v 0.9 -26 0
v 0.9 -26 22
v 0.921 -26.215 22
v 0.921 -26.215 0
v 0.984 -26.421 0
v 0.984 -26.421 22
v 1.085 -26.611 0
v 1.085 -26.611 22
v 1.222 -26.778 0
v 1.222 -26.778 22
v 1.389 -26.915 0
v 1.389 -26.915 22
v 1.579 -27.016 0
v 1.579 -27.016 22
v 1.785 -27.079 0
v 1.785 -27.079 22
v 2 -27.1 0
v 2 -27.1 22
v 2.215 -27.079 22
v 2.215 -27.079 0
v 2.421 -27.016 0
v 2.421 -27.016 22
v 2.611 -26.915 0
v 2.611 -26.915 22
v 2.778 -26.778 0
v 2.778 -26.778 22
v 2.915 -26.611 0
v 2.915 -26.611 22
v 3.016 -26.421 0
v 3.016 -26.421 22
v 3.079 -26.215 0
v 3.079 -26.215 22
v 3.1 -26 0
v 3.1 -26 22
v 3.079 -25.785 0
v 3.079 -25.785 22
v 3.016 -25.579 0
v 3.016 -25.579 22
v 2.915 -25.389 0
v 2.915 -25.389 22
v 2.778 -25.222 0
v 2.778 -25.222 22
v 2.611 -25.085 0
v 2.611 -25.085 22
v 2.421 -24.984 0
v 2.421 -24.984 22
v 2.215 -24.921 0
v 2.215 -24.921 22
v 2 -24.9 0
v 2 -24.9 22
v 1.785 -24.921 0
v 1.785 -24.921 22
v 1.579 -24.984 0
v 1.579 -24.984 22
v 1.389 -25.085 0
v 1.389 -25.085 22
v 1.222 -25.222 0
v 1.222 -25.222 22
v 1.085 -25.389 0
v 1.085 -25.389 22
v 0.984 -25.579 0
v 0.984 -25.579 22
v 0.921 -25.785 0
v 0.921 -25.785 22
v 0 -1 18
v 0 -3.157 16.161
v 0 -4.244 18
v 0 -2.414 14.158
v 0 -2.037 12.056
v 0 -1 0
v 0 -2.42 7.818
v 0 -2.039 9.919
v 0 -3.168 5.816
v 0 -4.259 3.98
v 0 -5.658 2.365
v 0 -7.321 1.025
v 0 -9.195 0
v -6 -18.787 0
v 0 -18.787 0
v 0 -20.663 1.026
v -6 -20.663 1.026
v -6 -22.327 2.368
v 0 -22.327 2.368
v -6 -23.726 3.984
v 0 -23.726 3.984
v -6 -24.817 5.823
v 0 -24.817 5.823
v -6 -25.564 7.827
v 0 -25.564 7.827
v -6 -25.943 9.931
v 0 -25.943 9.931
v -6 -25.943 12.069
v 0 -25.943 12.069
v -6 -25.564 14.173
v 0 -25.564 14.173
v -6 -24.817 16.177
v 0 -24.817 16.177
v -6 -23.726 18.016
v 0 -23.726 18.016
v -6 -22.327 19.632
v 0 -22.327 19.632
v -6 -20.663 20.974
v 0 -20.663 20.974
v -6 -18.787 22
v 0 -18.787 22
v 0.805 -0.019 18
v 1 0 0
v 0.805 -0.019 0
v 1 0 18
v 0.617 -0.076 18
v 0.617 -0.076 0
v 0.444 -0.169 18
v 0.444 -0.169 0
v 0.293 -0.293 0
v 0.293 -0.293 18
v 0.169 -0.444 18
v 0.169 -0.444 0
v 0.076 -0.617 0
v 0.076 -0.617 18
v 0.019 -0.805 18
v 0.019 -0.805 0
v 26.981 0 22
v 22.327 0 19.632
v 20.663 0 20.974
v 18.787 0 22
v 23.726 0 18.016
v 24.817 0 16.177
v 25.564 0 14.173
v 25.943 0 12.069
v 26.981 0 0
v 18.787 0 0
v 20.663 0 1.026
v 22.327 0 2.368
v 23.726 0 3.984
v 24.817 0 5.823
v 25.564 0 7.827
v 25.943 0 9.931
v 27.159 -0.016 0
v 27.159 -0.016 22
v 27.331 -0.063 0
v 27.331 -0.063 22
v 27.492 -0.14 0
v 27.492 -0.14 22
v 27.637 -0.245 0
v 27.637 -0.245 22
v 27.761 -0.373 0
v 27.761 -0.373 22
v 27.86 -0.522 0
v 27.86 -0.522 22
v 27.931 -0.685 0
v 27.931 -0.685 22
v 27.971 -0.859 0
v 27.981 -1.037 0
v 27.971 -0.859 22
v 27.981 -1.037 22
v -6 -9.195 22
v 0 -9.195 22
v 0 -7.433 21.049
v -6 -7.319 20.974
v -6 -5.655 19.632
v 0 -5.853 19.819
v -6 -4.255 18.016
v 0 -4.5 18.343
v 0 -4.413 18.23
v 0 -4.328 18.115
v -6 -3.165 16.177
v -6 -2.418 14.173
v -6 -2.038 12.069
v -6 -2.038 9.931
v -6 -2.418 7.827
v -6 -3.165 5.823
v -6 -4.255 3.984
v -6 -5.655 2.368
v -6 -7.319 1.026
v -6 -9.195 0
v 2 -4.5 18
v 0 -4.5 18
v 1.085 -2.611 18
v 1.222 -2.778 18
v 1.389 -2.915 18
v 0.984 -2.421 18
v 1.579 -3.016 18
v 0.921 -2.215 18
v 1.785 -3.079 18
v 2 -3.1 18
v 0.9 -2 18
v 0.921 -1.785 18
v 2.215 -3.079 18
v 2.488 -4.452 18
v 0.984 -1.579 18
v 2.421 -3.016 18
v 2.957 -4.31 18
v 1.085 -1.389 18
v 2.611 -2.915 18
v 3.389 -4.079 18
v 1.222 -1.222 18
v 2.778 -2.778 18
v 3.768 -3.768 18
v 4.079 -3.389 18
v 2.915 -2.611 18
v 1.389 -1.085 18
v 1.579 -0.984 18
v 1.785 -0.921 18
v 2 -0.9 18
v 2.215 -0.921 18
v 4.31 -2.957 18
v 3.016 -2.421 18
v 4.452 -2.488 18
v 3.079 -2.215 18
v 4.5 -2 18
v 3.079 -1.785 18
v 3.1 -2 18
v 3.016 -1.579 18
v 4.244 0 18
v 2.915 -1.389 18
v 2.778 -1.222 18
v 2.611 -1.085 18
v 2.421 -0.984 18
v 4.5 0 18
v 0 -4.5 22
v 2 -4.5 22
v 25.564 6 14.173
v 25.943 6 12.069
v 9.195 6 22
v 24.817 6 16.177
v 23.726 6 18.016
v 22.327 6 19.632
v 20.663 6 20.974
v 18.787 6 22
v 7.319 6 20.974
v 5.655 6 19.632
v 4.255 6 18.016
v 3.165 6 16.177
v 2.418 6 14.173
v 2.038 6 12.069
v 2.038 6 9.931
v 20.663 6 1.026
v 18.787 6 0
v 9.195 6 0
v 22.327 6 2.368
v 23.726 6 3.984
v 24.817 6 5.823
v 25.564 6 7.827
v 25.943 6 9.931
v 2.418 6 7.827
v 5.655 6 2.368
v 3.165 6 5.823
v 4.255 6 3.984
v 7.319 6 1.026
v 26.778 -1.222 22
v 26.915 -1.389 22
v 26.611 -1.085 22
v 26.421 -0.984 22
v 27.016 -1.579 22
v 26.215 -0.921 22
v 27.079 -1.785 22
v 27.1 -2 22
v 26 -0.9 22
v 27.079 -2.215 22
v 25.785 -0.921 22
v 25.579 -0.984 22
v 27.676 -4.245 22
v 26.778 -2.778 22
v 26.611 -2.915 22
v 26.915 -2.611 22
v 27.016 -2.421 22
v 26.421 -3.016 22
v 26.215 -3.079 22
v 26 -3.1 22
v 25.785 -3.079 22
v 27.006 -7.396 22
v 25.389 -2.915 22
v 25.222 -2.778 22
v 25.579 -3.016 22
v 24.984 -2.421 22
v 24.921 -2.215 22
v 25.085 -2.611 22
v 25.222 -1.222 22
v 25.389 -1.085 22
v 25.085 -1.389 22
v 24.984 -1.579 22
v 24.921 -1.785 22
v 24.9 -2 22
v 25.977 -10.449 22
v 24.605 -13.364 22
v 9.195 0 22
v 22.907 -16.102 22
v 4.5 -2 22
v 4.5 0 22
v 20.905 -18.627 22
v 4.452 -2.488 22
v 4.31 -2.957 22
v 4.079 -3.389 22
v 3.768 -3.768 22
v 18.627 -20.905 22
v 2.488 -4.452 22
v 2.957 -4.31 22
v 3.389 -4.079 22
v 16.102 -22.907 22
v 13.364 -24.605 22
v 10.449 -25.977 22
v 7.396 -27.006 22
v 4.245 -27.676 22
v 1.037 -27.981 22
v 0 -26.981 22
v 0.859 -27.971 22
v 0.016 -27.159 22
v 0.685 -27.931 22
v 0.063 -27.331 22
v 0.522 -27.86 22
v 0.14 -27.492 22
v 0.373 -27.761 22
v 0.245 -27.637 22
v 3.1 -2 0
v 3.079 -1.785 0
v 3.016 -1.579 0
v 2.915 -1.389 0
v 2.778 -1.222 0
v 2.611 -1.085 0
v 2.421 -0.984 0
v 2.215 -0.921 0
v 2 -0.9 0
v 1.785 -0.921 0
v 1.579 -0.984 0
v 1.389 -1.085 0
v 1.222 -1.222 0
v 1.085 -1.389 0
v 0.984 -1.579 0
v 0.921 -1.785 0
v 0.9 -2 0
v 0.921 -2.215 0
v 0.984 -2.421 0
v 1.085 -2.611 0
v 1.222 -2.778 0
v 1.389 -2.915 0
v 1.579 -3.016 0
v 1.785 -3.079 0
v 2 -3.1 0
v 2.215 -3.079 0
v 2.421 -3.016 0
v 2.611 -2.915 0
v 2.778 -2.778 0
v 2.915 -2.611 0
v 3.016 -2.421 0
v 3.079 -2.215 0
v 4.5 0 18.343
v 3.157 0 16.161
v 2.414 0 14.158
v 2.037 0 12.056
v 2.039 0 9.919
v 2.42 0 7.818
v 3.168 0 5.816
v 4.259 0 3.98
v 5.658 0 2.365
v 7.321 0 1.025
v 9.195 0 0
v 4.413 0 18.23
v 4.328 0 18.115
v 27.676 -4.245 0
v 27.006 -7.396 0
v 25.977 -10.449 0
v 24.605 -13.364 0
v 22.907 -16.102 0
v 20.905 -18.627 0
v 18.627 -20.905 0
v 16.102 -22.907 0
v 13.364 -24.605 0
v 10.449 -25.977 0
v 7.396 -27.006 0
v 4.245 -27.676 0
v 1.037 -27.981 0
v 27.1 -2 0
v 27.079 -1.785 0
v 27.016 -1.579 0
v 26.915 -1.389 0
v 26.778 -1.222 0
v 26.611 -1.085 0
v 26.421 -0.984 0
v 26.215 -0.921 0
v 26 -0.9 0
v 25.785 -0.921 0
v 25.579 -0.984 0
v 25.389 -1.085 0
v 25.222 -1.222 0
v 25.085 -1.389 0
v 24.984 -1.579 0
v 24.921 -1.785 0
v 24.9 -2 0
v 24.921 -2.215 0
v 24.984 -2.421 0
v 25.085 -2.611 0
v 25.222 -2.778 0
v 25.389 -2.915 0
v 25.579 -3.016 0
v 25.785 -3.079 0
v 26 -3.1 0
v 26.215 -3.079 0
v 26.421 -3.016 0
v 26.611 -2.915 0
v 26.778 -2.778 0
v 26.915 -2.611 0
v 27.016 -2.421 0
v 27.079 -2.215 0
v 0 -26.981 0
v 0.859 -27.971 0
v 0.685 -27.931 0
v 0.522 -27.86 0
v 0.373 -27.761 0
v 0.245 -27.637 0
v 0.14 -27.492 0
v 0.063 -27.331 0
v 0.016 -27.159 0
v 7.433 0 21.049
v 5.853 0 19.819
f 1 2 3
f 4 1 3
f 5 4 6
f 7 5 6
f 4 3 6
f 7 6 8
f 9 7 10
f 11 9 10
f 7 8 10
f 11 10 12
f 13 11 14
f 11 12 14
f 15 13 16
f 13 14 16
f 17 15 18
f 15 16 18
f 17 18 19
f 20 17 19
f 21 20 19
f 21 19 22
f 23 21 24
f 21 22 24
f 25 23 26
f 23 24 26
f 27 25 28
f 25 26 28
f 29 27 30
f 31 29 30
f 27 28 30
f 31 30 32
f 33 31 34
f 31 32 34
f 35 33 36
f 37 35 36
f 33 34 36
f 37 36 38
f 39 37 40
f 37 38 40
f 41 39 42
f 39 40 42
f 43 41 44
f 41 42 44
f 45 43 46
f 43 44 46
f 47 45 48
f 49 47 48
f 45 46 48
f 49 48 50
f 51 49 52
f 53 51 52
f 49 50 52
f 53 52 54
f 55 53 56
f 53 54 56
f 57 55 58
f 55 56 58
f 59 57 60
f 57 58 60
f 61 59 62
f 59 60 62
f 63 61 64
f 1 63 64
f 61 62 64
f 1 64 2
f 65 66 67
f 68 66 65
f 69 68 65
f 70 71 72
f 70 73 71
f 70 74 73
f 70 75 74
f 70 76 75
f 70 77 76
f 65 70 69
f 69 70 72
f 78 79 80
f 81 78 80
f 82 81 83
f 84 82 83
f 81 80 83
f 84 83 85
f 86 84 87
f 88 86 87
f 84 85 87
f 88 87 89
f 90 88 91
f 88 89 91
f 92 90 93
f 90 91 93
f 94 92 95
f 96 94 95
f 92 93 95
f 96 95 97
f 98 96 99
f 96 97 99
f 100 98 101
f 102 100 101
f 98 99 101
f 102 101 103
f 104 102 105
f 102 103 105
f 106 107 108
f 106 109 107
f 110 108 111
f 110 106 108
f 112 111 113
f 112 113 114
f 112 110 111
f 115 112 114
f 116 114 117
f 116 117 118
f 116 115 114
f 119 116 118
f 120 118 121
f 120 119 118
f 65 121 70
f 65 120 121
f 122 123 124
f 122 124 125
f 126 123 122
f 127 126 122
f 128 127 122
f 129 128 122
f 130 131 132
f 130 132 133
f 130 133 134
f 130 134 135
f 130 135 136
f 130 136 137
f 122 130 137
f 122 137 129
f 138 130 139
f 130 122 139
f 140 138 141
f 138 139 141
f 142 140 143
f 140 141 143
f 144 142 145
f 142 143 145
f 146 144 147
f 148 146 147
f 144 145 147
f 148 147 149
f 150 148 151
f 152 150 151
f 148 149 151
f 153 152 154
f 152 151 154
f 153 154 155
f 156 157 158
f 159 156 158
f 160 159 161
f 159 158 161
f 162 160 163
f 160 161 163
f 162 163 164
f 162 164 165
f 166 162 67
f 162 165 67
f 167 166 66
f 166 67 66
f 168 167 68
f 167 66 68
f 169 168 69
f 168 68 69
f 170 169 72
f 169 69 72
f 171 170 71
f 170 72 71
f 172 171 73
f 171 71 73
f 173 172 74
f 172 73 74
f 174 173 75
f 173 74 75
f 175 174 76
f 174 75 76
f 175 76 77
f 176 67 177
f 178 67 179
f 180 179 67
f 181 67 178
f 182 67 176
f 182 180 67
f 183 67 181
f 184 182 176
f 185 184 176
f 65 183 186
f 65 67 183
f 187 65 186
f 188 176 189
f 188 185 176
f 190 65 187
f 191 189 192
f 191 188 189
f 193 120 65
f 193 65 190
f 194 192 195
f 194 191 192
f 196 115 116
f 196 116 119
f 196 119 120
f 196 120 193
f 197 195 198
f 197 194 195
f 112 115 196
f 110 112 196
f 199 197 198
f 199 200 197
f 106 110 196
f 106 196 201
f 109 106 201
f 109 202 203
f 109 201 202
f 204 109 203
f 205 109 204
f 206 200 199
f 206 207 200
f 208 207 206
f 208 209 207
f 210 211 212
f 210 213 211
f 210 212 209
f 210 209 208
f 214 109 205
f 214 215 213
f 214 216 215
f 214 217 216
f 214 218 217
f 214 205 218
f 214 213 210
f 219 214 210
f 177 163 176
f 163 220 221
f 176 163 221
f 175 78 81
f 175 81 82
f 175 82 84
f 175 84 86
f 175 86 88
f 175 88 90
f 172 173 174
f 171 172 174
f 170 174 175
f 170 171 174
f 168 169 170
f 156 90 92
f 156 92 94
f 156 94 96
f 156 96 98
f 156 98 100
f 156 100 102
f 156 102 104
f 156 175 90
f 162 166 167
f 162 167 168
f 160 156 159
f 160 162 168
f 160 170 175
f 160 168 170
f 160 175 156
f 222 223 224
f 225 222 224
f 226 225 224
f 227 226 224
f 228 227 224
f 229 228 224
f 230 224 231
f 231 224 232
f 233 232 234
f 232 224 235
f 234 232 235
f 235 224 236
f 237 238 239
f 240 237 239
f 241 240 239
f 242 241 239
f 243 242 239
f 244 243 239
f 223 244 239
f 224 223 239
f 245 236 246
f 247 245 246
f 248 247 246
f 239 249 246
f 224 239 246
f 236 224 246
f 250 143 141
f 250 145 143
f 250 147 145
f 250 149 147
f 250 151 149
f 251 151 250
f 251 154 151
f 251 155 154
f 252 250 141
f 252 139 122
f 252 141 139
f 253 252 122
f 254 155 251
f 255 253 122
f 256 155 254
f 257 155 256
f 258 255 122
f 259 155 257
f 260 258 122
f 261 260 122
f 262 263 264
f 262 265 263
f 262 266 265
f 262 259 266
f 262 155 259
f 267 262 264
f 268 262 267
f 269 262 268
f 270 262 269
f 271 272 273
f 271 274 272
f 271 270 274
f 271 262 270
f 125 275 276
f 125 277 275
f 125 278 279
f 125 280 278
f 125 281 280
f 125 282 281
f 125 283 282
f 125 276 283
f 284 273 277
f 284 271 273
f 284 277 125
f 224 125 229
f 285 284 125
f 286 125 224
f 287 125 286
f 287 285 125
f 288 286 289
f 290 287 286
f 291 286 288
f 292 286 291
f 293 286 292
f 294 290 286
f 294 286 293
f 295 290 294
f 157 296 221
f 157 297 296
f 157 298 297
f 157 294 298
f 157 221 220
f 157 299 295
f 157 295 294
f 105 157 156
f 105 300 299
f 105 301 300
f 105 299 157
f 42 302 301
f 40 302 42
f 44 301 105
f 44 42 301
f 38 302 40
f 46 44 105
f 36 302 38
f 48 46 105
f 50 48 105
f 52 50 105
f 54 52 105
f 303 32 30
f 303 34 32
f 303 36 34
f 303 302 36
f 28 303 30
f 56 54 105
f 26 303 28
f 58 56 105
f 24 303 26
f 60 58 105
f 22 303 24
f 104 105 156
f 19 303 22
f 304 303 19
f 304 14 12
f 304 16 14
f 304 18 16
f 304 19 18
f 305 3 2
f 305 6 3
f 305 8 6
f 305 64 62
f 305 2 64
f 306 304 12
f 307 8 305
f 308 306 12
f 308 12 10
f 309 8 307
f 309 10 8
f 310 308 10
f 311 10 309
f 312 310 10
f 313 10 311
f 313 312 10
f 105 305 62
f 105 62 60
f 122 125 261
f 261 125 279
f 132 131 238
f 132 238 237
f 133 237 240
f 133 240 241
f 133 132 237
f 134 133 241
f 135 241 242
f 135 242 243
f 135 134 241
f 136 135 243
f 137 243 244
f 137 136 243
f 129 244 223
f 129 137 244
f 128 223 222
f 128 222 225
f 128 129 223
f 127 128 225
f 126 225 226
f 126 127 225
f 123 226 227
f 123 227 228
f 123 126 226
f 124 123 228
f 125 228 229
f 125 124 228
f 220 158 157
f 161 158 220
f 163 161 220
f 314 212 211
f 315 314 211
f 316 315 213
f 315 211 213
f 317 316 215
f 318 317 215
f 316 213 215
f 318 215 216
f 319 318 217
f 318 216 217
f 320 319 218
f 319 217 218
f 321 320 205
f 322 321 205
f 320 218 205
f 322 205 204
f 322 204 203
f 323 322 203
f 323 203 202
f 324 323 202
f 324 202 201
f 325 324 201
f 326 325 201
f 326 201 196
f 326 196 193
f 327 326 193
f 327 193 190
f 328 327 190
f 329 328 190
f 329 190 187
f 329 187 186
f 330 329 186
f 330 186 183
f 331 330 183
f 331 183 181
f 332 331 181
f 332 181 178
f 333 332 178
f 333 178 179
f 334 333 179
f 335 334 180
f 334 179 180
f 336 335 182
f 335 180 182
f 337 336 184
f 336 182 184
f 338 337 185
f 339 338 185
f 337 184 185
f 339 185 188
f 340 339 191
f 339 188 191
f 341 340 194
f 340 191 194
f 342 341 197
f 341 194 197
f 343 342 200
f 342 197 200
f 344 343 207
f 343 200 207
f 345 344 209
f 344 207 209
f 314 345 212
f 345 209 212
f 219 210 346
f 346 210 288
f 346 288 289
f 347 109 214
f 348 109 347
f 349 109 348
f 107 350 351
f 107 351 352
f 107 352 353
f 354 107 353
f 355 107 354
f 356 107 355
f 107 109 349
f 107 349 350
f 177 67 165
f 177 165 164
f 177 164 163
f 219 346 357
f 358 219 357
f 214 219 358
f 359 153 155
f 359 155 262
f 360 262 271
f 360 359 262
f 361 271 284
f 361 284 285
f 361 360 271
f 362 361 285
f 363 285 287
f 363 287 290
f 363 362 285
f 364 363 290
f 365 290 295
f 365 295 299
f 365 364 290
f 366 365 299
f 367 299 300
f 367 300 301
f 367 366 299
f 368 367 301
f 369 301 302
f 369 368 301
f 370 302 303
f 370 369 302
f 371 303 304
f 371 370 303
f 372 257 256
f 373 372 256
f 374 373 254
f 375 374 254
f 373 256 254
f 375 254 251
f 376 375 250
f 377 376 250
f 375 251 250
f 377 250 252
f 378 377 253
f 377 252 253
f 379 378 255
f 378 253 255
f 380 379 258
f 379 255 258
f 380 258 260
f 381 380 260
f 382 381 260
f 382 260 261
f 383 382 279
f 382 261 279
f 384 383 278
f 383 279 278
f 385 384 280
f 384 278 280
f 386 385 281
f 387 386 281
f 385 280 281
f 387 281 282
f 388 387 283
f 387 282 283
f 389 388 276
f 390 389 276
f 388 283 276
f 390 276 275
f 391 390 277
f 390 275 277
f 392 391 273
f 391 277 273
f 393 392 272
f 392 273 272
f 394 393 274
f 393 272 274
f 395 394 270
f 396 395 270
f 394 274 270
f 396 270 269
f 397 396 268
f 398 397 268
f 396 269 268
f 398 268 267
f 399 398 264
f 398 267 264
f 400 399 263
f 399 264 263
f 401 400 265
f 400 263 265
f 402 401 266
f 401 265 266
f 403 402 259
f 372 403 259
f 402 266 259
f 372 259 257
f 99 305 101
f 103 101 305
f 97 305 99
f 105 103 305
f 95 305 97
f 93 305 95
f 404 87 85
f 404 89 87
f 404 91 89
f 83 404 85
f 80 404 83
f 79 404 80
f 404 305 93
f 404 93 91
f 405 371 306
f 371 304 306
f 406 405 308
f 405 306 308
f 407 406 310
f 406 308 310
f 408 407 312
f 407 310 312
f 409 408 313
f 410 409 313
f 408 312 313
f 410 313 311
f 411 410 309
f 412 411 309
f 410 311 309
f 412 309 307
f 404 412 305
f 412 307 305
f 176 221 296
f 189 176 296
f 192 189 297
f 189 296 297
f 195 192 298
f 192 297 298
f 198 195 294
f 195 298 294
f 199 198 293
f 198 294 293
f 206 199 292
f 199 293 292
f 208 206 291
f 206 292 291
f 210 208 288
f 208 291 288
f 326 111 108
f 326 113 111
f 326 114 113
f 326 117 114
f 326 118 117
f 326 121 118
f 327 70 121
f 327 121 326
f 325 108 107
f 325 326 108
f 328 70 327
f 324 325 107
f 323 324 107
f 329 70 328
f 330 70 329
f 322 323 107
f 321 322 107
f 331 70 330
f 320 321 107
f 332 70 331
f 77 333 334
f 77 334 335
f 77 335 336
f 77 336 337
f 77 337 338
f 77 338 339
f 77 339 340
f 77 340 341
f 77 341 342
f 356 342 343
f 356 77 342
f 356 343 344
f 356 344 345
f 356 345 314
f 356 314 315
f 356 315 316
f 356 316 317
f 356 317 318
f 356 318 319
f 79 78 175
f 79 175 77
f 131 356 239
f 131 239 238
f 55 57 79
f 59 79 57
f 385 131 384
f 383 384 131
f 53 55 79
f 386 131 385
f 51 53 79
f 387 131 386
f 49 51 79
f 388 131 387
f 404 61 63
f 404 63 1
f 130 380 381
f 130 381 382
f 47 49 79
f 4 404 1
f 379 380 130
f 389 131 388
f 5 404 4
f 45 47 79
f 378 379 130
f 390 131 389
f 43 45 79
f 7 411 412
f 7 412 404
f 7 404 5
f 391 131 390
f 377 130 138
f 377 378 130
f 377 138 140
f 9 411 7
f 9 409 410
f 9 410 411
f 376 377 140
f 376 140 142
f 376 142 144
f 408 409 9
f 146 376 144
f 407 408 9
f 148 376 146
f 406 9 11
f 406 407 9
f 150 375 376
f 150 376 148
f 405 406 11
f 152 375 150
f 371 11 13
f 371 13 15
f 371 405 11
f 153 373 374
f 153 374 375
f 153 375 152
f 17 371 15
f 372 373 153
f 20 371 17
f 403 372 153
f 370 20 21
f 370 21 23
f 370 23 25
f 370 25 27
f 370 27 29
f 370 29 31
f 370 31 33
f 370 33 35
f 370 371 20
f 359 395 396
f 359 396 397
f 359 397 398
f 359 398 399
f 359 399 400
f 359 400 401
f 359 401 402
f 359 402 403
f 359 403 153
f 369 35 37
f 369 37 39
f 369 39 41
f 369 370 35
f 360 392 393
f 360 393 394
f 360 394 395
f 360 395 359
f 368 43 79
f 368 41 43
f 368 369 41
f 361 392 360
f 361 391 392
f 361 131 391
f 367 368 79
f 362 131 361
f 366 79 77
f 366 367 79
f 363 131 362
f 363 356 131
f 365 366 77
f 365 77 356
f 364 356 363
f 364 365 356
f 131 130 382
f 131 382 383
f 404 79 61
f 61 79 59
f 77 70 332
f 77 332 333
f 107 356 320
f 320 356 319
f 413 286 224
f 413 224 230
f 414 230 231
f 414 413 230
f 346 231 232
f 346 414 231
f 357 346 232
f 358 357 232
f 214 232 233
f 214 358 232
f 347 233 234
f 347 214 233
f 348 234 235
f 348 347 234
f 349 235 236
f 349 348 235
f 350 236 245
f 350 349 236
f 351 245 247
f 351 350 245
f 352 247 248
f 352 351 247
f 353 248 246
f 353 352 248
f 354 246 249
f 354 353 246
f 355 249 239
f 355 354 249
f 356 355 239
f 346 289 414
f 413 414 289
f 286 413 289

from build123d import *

# Parameters (mm, degrees)
EXTRUDE_1_DEPTH     = 22
SKETCH_2_R          = 1.1
CUT_EXTRUDE_1_DEPTH = 22
CUT_EXTRUDE_2_DEPTH = 4
FILLET_2_R          = 1
EXTRUDE_2_DEPTH     = 6
EXTRUDE_3_DEPTH     = 6


with BuildPart() as part:
    # 草图1 → 凸台-拉伸1 (new body)
    with BuildSketch(Plane.XY):
        with BuildLine():
            Line((0, 0), (28, 0))
            ThreePointArc((28, 0), (19.798989873, -19.798989873), (0, -28))
            Line((0, -28), (0, 0))
        make_face()
    extrude(amount=EXTRUDE_1_DEPTH)

    # 草图2 → 切除-拉伸1 (cut)
    with BuildSketch(Plane.XY.offset(22)):
        with Locations((2, -2)):
            Circle(SKETCH_2_R)
        with Locations((26, -2)):
            Circle(SKETCH_2_R)
        with Locations(Location((2, -26, 0), (0, 0, 180))):
            Circle(SKETCH_2_R)
    extrude(amount=-CUT_EXTRUDE_1_DEPTH, mode=Mode.SUBTRACT)

    # 草图4 → 切除-拉伸2 (cut)
    with BuildSketch(Plane.XY.offset(22)):
        with BuildLine():
            Line((4.5, -2), (4.5, 0.5))
            Line((4.5, 0.5), (-2.867094288, 0.5))
            Line((-2.867094288, 0.5), (-2.867094288, -4.5))
            Line((-2.867094288, -4.5), (2, -4.5))
            ThreePointArc((2, -4.5), (3.767766953, -3.767766953), (4.5, -2))
        make_face()
    extrude(amount=-CUT_EXTRUDE_2_DEPTH, mode=Mode.SUBTRACT)

    # 圆角2
    fillet_2_edges = [part.edges().sort_by_distance(p)[0] for p in [
        (0, 0, 9),
        (28, 0, 11),
        (0, -28, 11),
    ]]
    fillet(fillet_2_edges, radius=FILLET_2_R)

    # 草图5 → 凸台-拉伸2 (add)
    with BuildSketch(Plane.ZY):
        with BuildLine():
            Line((0, -9.19490604), (0, -18.786569087))
            ThreePointArc((0, -18.786569087), (11, -25.990737563), (22, -18.786569087))
            Line((22, -18.786569087), (22, -9.19490604))
            ThreePointArc((22, -9.19490604), (11, -1.990737563), (0, -9.19490604))
        make_face()
    extrude(amount=EXTRUDE_2_DEPTH)

    # 草图6 → 凸台-拉伸3 (add)
    with BuildSketch(Plane(origin=(0, 0, 0), x_dir=(1, 0, 0), z_dir=(0, 1, 0))):
        with BuildLine():
            Line((9.19490604, 0), (18.786569087, 0))
            ThreePointArc((18.786569087, 0), (25.990737563, -11), (18.786569087, -22))
            Line((18.786569087, -22), (9.19490604, -22))
            ThreePointArc((9.19490604, -22), (1.990737563, -11), (9.19490604, 0))
        make_face()
    extrude(amount=EXTRUDE_3_DEPTH)


solid = part.part
